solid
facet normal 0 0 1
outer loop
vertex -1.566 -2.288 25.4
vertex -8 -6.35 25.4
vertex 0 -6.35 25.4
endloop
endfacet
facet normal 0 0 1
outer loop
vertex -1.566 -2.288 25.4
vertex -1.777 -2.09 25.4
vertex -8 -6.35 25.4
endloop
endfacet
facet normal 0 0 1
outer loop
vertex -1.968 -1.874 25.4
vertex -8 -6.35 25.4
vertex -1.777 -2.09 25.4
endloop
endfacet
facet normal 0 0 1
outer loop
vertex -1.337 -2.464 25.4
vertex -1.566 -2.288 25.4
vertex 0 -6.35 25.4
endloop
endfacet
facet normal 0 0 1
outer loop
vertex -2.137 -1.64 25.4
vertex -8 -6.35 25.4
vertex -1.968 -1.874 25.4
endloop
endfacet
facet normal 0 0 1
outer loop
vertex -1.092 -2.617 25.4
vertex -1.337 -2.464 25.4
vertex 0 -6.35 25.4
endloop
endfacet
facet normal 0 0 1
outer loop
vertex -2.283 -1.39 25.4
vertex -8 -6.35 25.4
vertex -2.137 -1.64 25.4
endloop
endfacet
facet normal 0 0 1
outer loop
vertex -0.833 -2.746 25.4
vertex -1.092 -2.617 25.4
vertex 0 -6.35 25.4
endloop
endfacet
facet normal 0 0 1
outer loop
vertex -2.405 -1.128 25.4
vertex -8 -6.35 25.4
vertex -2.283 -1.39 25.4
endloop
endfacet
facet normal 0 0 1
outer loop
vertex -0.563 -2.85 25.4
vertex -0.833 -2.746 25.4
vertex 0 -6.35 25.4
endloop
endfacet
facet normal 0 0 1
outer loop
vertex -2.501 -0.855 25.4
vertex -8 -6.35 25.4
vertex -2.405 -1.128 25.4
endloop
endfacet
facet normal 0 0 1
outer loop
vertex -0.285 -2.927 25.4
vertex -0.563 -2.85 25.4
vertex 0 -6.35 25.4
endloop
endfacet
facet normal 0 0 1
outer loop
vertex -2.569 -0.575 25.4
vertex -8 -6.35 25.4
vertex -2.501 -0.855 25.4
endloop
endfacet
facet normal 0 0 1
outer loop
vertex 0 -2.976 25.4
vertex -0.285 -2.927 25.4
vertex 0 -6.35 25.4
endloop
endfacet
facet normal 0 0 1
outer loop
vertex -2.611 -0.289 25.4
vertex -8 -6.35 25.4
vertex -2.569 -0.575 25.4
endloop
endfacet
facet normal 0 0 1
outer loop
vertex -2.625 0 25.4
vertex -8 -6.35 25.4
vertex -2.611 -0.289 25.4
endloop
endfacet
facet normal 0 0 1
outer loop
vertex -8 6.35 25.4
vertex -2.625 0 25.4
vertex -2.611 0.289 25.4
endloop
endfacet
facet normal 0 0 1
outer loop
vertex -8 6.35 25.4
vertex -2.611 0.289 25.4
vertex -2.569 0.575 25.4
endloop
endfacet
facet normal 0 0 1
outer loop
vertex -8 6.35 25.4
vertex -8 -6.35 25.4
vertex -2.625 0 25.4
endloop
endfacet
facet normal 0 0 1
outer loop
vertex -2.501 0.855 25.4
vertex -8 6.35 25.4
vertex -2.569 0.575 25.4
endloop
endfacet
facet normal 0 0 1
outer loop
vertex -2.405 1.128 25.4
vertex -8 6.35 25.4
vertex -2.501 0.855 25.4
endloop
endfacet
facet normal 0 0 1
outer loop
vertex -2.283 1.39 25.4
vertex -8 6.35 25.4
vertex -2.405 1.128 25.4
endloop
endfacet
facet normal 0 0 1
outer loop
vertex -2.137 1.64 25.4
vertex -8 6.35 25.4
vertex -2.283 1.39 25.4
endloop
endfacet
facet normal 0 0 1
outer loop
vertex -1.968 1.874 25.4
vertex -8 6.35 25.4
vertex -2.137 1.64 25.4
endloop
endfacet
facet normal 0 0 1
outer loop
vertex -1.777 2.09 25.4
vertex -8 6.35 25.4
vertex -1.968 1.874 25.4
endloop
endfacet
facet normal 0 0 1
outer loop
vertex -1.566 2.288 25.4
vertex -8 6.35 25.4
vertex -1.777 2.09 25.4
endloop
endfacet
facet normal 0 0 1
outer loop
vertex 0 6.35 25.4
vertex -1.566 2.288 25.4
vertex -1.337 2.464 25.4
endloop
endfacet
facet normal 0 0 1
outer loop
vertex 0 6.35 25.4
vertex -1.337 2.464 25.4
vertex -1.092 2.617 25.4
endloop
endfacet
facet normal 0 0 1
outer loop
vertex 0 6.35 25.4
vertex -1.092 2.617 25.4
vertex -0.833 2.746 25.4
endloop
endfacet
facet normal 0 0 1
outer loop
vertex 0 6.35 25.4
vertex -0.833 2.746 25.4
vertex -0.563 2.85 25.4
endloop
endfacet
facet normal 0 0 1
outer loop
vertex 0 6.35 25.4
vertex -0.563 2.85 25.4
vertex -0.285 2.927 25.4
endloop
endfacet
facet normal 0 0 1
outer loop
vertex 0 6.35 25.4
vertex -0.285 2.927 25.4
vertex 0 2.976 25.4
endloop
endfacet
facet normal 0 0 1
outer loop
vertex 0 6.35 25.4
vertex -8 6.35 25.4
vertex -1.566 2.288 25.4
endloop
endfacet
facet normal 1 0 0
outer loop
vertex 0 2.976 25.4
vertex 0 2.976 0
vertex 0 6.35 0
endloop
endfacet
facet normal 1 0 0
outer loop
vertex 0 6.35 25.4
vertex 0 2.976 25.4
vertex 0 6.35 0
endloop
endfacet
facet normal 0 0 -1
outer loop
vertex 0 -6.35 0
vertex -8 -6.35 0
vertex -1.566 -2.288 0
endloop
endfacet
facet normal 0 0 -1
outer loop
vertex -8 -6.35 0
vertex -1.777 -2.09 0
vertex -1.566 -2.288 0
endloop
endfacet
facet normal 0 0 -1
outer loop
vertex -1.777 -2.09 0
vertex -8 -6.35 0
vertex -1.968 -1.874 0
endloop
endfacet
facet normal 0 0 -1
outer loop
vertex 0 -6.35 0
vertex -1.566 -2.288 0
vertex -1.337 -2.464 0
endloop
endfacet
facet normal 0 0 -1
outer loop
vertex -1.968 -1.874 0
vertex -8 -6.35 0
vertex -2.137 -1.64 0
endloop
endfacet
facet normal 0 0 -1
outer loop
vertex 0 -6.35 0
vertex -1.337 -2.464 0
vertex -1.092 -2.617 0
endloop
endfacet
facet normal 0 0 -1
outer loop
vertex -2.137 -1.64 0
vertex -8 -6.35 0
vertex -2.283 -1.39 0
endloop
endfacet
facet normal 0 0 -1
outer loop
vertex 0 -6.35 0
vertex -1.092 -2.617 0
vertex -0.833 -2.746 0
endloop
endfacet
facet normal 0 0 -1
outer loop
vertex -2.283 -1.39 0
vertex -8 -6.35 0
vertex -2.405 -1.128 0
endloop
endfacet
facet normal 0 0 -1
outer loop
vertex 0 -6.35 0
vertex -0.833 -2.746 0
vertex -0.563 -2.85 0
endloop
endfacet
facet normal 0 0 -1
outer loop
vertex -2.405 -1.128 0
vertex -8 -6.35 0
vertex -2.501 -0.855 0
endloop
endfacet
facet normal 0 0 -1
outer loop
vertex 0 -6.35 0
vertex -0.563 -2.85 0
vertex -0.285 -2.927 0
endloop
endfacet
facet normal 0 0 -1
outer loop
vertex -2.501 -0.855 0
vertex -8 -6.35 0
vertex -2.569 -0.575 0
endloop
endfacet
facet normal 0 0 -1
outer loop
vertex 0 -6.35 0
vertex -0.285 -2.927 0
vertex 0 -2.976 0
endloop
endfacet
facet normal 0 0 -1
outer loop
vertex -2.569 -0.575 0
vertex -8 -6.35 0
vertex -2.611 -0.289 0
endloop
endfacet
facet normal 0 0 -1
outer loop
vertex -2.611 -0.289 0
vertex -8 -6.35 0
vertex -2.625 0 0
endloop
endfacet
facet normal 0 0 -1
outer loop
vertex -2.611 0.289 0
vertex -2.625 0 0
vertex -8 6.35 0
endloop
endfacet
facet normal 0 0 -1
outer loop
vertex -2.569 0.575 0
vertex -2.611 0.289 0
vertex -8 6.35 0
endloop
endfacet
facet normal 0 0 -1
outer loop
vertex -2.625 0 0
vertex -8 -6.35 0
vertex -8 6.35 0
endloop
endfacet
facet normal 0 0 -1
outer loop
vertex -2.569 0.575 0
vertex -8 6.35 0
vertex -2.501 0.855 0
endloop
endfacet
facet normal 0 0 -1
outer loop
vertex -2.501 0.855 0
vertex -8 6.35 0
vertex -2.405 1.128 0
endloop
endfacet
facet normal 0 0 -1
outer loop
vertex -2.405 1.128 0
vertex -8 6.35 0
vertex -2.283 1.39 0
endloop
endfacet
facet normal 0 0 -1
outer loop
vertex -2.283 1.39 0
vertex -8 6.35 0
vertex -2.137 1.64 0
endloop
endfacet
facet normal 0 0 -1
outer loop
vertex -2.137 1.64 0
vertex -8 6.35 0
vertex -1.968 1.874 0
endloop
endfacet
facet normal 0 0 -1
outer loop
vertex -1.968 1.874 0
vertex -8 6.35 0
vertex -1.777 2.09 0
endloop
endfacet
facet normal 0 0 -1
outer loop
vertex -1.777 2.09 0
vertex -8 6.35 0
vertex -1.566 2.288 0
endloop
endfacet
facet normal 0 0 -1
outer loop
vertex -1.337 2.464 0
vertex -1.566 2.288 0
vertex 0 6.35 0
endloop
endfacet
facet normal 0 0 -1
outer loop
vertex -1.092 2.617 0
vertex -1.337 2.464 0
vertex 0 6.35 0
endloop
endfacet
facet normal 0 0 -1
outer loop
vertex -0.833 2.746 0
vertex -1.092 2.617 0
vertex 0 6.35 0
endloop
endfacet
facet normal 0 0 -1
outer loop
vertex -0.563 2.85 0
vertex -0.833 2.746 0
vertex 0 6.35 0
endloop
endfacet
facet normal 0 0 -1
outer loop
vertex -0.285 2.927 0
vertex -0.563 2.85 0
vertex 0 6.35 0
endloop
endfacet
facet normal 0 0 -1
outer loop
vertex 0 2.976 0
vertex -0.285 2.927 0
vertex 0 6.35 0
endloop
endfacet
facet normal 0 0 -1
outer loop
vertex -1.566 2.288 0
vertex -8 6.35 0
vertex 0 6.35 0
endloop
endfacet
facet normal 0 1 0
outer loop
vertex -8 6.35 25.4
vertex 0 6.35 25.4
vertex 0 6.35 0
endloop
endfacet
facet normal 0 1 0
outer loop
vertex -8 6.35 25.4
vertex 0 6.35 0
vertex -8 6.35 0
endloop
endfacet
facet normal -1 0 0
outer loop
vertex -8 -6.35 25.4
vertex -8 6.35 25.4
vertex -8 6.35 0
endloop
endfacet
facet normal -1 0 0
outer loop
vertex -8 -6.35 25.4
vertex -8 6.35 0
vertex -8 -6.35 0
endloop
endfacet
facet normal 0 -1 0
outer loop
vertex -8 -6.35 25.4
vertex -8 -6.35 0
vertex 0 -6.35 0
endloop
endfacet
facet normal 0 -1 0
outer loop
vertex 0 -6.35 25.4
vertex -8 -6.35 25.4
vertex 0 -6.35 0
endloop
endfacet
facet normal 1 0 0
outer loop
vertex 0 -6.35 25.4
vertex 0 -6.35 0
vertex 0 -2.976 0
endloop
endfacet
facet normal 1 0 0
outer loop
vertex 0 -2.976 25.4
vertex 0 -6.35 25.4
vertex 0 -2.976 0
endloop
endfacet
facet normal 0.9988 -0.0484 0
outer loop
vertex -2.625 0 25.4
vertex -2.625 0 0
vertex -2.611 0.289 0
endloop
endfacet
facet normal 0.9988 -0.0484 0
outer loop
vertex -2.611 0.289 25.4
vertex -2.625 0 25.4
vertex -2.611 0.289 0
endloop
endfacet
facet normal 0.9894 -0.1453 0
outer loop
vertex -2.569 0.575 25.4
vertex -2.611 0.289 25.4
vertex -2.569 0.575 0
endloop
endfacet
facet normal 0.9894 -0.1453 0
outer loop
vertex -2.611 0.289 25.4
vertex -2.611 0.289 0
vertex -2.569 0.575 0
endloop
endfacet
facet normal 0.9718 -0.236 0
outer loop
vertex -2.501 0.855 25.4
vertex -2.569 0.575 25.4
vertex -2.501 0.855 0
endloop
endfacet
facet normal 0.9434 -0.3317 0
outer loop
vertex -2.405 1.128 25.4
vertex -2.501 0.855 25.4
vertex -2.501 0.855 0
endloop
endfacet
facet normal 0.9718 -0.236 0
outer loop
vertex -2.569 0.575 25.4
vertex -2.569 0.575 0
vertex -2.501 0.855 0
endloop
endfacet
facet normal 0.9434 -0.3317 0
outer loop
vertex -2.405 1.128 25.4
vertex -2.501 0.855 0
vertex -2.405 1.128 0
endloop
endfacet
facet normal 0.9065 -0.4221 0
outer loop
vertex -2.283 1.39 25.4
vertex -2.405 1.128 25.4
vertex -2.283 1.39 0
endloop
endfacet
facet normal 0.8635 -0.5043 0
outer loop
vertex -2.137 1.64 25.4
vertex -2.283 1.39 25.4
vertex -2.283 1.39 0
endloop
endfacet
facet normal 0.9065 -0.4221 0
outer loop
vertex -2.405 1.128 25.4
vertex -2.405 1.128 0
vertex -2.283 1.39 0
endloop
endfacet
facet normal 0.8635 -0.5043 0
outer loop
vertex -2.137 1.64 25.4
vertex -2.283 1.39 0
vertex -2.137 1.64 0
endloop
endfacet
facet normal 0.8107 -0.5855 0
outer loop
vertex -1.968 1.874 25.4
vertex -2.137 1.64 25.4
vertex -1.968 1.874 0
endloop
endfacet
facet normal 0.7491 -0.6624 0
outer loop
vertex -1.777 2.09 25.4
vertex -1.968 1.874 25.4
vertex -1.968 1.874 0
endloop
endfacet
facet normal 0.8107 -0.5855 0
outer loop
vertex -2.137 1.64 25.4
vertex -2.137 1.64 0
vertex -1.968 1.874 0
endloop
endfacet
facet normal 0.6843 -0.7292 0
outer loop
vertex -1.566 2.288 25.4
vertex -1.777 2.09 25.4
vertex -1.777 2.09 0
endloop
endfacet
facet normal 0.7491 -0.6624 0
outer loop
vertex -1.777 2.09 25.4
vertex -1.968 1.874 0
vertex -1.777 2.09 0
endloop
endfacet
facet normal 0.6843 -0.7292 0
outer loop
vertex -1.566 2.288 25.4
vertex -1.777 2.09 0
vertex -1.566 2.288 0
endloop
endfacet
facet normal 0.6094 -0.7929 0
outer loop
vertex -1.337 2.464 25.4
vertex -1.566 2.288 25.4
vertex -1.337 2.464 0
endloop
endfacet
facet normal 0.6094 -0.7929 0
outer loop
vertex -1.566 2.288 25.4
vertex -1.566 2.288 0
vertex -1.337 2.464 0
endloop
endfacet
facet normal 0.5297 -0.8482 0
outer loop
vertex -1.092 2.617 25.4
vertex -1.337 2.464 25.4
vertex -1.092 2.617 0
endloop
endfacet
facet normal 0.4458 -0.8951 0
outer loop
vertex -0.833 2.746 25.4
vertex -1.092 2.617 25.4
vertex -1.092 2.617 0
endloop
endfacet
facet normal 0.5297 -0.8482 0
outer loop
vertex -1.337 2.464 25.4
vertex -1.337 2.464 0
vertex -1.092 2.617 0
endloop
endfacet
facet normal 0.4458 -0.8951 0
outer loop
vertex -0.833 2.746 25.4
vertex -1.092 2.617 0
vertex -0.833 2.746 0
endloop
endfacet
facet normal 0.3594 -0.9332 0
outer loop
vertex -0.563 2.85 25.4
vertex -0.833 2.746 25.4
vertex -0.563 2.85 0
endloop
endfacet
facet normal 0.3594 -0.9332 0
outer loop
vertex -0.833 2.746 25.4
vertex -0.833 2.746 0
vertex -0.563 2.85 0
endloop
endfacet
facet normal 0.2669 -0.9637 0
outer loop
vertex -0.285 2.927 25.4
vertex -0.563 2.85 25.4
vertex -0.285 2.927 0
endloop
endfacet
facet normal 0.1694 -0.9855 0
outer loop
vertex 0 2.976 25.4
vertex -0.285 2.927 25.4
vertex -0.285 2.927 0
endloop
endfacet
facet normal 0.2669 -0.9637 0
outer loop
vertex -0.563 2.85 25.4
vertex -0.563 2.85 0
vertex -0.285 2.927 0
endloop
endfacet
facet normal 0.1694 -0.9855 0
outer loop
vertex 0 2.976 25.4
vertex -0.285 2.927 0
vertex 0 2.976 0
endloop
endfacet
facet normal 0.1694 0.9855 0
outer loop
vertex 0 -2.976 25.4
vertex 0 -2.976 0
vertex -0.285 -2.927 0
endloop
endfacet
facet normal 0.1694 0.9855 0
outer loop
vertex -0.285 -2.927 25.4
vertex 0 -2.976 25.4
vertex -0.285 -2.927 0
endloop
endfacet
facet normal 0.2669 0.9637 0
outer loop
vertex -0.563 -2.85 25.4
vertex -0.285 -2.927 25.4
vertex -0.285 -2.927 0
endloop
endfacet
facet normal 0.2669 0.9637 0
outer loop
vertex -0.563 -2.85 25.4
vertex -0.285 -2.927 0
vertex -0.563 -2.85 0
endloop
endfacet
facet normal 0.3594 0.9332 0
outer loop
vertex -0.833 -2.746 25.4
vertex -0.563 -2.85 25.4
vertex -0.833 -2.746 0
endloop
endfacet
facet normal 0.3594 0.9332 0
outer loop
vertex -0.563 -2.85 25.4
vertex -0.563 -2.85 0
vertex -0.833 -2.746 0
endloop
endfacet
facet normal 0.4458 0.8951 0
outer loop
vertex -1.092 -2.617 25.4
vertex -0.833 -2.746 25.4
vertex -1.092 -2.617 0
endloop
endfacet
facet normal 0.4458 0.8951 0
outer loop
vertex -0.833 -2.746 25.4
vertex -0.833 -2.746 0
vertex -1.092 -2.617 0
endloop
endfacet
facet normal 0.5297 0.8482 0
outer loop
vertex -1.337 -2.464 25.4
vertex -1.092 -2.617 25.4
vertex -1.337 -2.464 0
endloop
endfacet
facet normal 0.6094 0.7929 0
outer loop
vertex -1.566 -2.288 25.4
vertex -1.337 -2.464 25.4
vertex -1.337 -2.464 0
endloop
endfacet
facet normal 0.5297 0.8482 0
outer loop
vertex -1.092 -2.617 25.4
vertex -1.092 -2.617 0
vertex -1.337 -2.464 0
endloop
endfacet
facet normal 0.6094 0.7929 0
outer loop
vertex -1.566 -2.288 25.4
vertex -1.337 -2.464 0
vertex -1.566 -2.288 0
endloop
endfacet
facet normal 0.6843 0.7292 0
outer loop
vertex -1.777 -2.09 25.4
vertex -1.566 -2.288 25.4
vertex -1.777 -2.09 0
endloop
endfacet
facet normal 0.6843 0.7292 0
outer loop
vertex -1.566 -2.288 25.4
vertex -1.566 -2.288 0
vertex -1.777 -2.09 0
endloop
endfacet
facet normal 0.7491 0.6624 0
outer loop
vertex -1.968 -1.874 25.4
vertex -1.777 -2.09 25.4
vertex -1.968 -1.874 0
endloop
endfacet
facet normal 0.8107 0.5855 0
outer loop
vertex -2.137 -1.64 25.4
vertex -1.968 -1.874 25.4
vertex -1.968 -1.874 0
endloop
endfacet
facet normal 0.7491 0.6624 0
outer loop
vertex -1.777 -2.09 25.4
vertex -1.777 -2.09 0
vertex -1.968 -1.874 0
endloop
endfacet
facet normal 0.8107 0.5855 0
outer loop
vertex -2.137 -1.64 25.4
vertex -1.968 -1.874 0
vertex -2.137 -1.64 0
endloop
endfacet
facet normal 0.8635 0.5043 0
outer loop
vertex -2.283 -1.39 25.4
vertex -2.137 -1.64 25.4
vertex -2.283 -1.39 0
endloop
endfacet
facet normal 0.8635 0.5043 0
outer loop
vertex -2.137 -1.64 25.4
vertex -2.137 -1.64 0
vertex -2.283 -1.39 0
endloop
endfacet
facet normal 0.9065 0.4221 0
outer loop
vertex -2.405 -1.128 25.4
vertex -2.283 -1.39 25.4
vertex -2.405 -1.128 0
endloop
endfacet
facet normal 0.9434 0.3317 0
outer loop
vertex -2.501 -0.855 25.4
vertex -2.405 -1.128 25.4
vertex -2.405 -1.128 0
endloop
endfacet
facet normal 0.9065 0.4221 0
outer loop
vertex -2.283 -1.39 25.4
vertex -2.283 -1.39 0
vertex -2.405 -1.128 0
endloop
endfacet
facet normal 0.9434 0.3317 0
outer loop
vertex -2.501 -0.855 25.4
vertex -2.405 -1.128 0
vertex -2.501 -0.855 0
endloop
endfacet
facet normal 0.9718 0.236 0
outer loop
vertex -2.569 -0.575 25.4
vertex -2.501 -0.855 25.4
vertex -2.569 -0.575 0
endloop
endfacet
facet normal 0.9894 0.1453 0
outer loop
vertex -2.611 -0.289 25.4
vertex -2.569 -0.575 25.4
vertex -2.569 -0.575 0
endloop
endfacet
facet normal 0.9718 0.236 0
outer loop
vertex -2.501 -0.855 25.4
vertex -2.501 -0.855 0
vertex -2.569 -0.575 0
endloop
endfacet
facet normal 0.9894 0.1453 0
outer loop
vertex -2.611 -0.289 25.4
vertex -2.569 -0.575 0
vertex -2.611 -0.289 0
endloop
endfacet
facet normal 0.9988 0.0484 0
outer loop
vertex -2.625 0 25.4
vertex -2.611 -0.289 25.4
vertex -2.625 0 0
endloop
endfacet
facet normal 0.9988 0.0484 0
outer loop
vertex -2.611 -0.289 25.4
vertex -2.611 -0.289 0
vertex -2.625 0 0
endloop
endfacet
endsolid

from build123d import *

# Parameters (mm, degrees)
F1_DEPTH = 25.4


with BuildPart() as f1:
    # F0 (on Top) → F1 (new body)
    with BuildSketch(Plane.XY):
        with BuildLine():
            Line((-2.625, 0), (-8, 0))
            Line((-8, 0), (-8, -6.35))
            Line((-8, -6.35), (0, -6.35))
            Line((0, -6.35), (0, -2.97647))
            ThreePointArc((0, -2.97647), (-1.875, -1.984313), (-2.625, 0))
        make_face()
        with BuildLine():
            Line((0, 6.35), (-8, 6.35))
            Line((-8, 6.35), (-8, 0))
            Line((-8, 0), (-2.625, 0))
            ThreePointArc((-2.625, 0), (-1.875, 1.984313), (0, 2.97647))
            Line((0, 2.97647), (0, 6.35))
        make_face()
    extrude(amount=F1_DEPTH)


solid = f1.part
